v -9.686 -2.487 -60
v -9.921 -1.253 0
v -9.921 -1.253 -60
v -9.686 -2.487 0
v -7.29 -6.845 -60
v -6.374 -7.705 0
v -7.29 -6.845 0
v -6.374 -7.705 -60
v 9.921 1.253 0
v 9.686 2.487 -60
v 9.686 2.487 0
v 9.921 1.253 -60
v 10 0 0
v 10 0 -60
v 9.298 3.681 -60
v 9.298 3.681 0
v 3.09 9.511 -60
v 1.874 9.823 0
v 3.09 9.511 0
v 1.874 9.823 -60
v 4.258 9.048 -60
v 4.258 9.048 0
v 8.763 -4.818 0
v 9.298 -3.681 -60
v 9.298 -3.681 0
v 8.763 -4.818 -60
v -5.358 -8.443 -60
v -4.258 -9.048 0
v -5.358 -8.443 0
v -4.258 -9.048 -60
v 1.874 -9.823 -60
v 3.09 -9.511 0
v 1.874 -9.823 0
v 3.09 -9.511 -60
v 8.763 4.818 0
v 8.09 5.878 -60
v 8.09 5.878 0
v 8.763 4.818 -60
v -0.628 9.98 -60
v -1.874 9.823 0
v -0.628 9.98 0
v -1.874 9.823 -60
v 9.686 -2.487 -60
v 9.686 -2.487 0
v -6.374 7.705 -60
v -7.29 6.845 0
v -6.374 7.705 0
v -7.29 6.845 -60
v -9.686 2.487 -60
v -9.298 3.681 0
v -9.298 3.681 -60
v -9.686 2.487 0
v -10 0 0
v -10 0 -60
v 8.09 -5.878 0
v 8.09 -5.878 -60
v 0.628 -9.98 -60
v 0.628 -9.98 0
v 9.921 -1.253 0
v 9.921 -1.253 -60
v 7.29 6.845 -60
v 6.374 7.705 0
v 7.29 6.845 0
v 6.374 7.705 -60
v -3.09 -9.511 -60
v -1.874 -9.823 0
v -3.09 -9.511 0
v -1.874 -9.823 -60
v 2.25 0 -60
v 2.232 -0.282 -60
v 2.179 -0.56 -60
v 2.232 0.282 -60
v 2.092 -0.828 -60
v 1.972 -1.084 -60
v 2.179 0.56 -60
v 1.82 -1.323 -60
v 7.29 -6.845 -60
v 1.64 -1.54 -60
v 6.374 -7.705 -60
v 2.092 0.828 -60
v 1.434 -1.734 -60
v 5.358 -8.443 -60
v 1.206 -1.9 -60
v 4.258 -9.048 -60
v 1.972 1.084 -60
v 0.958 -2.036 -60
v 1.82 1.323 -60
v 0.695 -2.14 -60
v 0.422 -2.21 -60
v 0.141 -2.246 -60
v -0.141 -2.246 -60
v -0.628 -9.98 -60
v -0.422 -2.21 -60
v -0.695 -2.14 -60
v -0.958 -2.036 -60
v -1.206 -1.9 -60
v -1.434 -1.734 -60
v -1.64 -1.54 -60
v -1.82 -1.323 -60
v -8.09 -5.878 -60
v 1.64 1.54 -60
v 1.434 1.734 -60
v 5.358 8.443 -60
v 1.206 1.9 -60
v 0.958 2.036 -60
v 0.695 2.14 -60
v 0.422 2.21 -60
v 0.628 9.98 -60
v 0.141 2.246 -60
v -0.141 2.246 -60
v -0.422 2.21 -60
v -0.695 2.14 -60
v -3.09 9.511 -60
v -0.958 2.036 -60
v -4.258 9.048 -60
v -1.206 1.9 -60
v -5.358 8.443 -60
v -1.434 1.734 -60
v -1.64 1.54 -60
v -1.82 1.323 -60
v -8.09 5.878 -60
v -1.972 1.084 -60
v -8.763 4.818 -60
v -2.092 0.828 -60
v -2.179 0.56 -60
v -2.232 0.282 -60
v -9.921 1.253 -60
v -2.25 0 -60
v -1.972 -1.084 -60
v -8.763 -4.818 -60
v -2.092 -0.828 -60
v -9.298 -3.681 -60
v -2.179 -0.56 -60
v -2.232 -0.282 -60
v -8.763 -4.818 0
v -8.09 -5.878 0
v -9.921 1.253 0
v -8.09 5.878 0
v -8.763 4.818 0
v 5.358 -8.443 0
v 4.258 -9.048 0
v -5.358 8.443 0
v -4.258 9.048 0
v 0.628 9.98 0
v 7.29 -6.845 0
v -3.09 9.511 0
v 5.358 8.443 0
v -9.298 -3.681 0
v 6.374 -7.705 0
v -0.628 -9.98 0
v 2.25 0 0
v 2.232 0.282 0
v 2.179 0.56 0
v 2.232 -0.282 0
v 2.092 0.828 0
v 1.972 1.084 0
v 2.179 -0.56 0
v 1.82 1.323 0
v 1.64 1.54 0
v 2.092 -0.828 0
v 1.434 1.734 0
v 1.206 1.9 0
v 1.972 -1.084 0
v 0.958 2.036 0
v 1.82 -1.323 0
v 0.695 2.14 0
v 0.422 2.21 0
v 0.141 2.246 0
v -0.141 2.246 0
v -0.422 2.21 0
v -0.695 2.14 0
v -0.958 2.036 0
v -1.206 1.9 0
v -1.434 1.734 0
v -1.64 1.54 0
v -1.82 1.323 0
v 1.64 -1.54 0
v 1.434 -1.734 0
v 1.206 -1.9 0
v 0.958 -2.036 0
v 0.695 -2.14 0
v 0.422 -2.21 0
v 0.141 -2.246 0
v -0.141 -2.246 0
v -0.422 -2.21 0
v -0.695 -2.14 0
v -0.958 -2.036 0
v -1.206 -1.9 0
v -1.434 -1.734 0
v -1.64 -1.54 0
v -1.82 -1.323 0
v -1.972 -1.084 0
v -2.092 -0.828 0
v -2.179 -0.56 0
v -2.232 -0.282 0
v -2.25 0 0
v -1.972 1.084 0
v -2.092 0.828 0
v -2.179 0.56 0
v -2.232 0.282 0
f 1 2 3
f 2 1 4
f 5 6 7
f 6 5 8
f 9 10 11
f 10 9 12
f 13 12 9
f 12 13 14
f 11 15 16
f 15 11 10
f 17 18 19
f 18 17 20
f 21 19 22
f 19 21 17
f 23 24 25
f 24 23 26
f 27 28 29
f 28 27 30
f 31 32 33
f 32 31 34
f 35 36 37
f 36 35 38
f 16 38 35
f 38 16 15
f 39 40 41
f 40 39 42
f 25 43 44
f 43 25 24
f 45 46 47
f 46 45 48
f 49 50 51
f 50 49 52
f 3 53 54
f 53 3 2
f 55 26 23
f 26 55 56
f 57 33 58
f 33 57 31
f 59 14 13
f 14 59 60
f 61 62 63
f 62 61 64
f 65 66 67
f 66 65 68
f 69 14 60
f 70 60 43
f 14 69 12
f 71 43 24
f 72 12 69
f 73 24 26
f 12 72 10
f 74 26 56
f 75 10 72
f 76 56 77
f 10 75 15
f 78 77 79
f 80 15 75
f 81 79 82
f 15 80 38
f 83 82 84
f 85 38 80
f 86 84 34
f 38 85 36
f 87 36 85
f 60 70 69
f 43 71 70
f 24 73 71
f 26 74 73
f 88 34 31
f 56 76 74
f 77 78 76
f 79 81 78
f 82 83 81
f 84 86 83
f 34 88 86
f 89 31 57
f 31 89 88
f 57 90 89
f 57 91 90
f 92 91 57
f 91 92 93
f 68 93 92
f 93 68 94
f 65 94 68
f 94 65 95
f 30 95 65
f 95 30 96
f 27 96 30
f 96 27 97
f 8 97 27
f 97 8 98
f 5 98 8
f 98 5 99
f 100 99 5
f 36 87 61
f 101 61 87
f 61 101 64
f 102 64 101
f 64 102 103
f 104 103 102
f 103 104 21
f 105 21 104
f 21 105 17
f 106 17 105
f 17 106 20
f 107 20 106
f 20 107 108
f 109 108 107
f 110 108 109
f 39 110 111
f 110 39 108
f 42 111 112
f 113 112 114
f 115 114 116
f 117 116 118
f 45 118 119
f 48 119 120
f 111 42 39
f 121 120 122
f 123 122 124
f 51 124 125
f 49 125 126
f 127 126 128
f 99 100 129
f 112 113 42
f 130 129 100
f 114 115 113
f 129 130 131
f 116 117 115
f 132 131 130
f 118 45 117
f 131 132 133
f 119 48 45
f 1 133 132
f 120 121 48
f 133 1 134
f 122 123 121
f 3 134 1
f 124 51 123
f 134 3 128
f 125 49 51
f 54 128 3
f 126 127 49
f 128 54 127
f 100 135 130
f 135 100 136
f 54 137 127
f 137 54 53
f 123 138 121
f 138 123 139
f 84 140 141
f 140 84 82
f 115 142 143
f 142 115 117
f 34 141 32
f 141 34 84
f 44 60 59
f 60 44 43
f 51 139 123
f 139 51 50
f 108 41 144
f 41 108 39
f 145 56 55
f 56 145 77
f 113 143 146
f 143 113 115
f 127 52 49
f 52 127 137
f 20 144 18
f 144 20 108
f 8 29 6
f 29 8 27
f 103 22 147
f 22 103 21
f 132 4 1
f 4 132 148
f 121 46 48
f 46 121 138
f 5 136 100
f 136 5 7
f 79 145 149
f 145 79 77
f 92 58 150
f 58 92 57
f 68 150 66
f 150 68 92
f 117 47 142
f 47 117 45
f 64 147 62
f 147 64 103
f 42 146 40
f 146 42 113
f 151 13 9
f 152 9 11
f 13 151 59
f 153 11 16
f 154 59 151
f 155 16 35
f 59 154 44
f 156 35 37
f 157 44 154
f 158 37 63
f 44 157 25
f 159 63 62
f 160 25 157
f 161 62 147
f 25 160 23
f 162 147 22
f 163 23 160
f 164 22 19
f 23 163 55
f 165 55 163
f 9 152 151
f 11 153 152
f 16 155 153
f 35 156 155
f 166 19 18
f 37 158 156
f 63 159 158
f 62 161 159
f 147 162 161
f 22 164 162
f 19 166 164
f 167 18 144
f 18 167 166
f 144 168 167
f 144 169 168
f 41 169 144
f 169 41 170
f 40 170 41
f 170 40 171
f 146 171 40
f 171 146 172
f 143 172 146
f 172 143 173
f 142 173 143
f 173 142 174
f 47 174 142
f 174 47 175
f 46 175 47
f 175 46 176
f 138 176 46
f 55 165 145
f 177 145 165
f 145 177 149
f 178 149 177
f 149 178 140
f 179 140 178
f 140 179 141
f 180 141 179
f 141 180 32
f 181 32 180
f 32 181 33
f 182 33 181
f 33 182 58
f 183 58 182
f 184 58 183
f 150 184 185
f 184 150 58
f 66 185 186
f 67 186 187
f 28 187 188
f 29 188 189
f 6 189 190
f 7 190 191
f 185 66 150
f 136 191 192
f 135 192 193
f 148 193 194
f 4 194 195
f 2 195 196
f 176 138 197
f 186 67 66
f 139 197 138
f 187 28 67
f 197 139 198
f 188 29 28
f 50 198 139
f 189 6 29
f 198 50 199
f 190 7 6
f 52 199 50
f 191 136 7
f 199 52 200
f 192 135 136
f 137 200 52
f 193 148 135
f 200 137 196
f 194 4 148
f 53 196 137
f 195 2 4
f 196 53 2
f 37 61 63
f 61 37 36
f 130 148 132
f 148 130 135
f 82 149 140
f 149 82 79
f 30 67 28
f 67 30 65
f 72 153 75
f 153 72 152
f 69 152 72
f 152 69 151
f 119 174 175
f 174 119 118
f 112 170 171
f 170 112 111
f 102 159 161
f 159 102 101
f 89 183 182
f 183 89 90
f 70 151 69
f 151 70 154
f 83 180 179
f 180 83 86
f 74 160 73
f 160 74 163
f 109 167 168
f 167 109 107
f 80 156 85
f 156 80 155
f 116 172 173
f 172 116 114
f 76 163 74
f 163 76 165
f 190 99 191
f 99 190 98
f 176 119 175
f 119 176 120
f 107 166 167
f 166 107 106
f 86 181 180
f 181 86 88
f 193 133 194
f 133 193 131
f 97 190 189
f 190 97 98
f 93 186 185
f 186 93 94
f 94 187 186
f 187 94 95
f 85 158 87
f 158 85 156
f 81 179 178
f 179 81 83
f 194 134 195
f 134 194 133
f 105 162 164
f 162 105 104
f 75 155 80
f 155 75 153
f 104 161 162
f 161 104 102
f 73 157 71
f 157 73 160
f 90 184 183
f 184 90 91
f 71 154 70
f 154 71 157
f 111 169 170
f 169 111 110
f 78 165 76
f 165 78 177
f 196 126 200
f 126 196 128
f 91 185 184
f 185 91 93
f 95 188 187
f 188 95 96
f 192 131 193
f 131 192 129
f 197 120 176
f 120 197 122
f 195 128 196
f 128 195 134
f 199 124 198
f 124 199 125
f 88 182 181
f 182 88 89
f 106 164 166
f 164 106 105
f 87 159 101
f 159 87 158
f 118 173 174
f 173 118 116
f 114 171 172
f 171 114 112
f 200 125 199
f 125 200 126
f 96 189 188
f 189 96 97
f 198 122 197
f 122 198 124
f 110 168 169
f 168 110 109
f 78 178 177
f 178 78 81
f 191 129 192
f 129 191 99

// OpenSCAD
$fn = 50;


difference() {
	union() {
		translate(v = [0, 0, -60.0000000000]) {
			cylinder(h = 60, r = 10.0000000000);
		}
		cylinder(h = 0, r = 13.0000000000);
	}
	union() {
		#translate(v = [0, 0, -60]) {
			cylinder(h = 60, r = 2.2500000000);
		}
	}
}
